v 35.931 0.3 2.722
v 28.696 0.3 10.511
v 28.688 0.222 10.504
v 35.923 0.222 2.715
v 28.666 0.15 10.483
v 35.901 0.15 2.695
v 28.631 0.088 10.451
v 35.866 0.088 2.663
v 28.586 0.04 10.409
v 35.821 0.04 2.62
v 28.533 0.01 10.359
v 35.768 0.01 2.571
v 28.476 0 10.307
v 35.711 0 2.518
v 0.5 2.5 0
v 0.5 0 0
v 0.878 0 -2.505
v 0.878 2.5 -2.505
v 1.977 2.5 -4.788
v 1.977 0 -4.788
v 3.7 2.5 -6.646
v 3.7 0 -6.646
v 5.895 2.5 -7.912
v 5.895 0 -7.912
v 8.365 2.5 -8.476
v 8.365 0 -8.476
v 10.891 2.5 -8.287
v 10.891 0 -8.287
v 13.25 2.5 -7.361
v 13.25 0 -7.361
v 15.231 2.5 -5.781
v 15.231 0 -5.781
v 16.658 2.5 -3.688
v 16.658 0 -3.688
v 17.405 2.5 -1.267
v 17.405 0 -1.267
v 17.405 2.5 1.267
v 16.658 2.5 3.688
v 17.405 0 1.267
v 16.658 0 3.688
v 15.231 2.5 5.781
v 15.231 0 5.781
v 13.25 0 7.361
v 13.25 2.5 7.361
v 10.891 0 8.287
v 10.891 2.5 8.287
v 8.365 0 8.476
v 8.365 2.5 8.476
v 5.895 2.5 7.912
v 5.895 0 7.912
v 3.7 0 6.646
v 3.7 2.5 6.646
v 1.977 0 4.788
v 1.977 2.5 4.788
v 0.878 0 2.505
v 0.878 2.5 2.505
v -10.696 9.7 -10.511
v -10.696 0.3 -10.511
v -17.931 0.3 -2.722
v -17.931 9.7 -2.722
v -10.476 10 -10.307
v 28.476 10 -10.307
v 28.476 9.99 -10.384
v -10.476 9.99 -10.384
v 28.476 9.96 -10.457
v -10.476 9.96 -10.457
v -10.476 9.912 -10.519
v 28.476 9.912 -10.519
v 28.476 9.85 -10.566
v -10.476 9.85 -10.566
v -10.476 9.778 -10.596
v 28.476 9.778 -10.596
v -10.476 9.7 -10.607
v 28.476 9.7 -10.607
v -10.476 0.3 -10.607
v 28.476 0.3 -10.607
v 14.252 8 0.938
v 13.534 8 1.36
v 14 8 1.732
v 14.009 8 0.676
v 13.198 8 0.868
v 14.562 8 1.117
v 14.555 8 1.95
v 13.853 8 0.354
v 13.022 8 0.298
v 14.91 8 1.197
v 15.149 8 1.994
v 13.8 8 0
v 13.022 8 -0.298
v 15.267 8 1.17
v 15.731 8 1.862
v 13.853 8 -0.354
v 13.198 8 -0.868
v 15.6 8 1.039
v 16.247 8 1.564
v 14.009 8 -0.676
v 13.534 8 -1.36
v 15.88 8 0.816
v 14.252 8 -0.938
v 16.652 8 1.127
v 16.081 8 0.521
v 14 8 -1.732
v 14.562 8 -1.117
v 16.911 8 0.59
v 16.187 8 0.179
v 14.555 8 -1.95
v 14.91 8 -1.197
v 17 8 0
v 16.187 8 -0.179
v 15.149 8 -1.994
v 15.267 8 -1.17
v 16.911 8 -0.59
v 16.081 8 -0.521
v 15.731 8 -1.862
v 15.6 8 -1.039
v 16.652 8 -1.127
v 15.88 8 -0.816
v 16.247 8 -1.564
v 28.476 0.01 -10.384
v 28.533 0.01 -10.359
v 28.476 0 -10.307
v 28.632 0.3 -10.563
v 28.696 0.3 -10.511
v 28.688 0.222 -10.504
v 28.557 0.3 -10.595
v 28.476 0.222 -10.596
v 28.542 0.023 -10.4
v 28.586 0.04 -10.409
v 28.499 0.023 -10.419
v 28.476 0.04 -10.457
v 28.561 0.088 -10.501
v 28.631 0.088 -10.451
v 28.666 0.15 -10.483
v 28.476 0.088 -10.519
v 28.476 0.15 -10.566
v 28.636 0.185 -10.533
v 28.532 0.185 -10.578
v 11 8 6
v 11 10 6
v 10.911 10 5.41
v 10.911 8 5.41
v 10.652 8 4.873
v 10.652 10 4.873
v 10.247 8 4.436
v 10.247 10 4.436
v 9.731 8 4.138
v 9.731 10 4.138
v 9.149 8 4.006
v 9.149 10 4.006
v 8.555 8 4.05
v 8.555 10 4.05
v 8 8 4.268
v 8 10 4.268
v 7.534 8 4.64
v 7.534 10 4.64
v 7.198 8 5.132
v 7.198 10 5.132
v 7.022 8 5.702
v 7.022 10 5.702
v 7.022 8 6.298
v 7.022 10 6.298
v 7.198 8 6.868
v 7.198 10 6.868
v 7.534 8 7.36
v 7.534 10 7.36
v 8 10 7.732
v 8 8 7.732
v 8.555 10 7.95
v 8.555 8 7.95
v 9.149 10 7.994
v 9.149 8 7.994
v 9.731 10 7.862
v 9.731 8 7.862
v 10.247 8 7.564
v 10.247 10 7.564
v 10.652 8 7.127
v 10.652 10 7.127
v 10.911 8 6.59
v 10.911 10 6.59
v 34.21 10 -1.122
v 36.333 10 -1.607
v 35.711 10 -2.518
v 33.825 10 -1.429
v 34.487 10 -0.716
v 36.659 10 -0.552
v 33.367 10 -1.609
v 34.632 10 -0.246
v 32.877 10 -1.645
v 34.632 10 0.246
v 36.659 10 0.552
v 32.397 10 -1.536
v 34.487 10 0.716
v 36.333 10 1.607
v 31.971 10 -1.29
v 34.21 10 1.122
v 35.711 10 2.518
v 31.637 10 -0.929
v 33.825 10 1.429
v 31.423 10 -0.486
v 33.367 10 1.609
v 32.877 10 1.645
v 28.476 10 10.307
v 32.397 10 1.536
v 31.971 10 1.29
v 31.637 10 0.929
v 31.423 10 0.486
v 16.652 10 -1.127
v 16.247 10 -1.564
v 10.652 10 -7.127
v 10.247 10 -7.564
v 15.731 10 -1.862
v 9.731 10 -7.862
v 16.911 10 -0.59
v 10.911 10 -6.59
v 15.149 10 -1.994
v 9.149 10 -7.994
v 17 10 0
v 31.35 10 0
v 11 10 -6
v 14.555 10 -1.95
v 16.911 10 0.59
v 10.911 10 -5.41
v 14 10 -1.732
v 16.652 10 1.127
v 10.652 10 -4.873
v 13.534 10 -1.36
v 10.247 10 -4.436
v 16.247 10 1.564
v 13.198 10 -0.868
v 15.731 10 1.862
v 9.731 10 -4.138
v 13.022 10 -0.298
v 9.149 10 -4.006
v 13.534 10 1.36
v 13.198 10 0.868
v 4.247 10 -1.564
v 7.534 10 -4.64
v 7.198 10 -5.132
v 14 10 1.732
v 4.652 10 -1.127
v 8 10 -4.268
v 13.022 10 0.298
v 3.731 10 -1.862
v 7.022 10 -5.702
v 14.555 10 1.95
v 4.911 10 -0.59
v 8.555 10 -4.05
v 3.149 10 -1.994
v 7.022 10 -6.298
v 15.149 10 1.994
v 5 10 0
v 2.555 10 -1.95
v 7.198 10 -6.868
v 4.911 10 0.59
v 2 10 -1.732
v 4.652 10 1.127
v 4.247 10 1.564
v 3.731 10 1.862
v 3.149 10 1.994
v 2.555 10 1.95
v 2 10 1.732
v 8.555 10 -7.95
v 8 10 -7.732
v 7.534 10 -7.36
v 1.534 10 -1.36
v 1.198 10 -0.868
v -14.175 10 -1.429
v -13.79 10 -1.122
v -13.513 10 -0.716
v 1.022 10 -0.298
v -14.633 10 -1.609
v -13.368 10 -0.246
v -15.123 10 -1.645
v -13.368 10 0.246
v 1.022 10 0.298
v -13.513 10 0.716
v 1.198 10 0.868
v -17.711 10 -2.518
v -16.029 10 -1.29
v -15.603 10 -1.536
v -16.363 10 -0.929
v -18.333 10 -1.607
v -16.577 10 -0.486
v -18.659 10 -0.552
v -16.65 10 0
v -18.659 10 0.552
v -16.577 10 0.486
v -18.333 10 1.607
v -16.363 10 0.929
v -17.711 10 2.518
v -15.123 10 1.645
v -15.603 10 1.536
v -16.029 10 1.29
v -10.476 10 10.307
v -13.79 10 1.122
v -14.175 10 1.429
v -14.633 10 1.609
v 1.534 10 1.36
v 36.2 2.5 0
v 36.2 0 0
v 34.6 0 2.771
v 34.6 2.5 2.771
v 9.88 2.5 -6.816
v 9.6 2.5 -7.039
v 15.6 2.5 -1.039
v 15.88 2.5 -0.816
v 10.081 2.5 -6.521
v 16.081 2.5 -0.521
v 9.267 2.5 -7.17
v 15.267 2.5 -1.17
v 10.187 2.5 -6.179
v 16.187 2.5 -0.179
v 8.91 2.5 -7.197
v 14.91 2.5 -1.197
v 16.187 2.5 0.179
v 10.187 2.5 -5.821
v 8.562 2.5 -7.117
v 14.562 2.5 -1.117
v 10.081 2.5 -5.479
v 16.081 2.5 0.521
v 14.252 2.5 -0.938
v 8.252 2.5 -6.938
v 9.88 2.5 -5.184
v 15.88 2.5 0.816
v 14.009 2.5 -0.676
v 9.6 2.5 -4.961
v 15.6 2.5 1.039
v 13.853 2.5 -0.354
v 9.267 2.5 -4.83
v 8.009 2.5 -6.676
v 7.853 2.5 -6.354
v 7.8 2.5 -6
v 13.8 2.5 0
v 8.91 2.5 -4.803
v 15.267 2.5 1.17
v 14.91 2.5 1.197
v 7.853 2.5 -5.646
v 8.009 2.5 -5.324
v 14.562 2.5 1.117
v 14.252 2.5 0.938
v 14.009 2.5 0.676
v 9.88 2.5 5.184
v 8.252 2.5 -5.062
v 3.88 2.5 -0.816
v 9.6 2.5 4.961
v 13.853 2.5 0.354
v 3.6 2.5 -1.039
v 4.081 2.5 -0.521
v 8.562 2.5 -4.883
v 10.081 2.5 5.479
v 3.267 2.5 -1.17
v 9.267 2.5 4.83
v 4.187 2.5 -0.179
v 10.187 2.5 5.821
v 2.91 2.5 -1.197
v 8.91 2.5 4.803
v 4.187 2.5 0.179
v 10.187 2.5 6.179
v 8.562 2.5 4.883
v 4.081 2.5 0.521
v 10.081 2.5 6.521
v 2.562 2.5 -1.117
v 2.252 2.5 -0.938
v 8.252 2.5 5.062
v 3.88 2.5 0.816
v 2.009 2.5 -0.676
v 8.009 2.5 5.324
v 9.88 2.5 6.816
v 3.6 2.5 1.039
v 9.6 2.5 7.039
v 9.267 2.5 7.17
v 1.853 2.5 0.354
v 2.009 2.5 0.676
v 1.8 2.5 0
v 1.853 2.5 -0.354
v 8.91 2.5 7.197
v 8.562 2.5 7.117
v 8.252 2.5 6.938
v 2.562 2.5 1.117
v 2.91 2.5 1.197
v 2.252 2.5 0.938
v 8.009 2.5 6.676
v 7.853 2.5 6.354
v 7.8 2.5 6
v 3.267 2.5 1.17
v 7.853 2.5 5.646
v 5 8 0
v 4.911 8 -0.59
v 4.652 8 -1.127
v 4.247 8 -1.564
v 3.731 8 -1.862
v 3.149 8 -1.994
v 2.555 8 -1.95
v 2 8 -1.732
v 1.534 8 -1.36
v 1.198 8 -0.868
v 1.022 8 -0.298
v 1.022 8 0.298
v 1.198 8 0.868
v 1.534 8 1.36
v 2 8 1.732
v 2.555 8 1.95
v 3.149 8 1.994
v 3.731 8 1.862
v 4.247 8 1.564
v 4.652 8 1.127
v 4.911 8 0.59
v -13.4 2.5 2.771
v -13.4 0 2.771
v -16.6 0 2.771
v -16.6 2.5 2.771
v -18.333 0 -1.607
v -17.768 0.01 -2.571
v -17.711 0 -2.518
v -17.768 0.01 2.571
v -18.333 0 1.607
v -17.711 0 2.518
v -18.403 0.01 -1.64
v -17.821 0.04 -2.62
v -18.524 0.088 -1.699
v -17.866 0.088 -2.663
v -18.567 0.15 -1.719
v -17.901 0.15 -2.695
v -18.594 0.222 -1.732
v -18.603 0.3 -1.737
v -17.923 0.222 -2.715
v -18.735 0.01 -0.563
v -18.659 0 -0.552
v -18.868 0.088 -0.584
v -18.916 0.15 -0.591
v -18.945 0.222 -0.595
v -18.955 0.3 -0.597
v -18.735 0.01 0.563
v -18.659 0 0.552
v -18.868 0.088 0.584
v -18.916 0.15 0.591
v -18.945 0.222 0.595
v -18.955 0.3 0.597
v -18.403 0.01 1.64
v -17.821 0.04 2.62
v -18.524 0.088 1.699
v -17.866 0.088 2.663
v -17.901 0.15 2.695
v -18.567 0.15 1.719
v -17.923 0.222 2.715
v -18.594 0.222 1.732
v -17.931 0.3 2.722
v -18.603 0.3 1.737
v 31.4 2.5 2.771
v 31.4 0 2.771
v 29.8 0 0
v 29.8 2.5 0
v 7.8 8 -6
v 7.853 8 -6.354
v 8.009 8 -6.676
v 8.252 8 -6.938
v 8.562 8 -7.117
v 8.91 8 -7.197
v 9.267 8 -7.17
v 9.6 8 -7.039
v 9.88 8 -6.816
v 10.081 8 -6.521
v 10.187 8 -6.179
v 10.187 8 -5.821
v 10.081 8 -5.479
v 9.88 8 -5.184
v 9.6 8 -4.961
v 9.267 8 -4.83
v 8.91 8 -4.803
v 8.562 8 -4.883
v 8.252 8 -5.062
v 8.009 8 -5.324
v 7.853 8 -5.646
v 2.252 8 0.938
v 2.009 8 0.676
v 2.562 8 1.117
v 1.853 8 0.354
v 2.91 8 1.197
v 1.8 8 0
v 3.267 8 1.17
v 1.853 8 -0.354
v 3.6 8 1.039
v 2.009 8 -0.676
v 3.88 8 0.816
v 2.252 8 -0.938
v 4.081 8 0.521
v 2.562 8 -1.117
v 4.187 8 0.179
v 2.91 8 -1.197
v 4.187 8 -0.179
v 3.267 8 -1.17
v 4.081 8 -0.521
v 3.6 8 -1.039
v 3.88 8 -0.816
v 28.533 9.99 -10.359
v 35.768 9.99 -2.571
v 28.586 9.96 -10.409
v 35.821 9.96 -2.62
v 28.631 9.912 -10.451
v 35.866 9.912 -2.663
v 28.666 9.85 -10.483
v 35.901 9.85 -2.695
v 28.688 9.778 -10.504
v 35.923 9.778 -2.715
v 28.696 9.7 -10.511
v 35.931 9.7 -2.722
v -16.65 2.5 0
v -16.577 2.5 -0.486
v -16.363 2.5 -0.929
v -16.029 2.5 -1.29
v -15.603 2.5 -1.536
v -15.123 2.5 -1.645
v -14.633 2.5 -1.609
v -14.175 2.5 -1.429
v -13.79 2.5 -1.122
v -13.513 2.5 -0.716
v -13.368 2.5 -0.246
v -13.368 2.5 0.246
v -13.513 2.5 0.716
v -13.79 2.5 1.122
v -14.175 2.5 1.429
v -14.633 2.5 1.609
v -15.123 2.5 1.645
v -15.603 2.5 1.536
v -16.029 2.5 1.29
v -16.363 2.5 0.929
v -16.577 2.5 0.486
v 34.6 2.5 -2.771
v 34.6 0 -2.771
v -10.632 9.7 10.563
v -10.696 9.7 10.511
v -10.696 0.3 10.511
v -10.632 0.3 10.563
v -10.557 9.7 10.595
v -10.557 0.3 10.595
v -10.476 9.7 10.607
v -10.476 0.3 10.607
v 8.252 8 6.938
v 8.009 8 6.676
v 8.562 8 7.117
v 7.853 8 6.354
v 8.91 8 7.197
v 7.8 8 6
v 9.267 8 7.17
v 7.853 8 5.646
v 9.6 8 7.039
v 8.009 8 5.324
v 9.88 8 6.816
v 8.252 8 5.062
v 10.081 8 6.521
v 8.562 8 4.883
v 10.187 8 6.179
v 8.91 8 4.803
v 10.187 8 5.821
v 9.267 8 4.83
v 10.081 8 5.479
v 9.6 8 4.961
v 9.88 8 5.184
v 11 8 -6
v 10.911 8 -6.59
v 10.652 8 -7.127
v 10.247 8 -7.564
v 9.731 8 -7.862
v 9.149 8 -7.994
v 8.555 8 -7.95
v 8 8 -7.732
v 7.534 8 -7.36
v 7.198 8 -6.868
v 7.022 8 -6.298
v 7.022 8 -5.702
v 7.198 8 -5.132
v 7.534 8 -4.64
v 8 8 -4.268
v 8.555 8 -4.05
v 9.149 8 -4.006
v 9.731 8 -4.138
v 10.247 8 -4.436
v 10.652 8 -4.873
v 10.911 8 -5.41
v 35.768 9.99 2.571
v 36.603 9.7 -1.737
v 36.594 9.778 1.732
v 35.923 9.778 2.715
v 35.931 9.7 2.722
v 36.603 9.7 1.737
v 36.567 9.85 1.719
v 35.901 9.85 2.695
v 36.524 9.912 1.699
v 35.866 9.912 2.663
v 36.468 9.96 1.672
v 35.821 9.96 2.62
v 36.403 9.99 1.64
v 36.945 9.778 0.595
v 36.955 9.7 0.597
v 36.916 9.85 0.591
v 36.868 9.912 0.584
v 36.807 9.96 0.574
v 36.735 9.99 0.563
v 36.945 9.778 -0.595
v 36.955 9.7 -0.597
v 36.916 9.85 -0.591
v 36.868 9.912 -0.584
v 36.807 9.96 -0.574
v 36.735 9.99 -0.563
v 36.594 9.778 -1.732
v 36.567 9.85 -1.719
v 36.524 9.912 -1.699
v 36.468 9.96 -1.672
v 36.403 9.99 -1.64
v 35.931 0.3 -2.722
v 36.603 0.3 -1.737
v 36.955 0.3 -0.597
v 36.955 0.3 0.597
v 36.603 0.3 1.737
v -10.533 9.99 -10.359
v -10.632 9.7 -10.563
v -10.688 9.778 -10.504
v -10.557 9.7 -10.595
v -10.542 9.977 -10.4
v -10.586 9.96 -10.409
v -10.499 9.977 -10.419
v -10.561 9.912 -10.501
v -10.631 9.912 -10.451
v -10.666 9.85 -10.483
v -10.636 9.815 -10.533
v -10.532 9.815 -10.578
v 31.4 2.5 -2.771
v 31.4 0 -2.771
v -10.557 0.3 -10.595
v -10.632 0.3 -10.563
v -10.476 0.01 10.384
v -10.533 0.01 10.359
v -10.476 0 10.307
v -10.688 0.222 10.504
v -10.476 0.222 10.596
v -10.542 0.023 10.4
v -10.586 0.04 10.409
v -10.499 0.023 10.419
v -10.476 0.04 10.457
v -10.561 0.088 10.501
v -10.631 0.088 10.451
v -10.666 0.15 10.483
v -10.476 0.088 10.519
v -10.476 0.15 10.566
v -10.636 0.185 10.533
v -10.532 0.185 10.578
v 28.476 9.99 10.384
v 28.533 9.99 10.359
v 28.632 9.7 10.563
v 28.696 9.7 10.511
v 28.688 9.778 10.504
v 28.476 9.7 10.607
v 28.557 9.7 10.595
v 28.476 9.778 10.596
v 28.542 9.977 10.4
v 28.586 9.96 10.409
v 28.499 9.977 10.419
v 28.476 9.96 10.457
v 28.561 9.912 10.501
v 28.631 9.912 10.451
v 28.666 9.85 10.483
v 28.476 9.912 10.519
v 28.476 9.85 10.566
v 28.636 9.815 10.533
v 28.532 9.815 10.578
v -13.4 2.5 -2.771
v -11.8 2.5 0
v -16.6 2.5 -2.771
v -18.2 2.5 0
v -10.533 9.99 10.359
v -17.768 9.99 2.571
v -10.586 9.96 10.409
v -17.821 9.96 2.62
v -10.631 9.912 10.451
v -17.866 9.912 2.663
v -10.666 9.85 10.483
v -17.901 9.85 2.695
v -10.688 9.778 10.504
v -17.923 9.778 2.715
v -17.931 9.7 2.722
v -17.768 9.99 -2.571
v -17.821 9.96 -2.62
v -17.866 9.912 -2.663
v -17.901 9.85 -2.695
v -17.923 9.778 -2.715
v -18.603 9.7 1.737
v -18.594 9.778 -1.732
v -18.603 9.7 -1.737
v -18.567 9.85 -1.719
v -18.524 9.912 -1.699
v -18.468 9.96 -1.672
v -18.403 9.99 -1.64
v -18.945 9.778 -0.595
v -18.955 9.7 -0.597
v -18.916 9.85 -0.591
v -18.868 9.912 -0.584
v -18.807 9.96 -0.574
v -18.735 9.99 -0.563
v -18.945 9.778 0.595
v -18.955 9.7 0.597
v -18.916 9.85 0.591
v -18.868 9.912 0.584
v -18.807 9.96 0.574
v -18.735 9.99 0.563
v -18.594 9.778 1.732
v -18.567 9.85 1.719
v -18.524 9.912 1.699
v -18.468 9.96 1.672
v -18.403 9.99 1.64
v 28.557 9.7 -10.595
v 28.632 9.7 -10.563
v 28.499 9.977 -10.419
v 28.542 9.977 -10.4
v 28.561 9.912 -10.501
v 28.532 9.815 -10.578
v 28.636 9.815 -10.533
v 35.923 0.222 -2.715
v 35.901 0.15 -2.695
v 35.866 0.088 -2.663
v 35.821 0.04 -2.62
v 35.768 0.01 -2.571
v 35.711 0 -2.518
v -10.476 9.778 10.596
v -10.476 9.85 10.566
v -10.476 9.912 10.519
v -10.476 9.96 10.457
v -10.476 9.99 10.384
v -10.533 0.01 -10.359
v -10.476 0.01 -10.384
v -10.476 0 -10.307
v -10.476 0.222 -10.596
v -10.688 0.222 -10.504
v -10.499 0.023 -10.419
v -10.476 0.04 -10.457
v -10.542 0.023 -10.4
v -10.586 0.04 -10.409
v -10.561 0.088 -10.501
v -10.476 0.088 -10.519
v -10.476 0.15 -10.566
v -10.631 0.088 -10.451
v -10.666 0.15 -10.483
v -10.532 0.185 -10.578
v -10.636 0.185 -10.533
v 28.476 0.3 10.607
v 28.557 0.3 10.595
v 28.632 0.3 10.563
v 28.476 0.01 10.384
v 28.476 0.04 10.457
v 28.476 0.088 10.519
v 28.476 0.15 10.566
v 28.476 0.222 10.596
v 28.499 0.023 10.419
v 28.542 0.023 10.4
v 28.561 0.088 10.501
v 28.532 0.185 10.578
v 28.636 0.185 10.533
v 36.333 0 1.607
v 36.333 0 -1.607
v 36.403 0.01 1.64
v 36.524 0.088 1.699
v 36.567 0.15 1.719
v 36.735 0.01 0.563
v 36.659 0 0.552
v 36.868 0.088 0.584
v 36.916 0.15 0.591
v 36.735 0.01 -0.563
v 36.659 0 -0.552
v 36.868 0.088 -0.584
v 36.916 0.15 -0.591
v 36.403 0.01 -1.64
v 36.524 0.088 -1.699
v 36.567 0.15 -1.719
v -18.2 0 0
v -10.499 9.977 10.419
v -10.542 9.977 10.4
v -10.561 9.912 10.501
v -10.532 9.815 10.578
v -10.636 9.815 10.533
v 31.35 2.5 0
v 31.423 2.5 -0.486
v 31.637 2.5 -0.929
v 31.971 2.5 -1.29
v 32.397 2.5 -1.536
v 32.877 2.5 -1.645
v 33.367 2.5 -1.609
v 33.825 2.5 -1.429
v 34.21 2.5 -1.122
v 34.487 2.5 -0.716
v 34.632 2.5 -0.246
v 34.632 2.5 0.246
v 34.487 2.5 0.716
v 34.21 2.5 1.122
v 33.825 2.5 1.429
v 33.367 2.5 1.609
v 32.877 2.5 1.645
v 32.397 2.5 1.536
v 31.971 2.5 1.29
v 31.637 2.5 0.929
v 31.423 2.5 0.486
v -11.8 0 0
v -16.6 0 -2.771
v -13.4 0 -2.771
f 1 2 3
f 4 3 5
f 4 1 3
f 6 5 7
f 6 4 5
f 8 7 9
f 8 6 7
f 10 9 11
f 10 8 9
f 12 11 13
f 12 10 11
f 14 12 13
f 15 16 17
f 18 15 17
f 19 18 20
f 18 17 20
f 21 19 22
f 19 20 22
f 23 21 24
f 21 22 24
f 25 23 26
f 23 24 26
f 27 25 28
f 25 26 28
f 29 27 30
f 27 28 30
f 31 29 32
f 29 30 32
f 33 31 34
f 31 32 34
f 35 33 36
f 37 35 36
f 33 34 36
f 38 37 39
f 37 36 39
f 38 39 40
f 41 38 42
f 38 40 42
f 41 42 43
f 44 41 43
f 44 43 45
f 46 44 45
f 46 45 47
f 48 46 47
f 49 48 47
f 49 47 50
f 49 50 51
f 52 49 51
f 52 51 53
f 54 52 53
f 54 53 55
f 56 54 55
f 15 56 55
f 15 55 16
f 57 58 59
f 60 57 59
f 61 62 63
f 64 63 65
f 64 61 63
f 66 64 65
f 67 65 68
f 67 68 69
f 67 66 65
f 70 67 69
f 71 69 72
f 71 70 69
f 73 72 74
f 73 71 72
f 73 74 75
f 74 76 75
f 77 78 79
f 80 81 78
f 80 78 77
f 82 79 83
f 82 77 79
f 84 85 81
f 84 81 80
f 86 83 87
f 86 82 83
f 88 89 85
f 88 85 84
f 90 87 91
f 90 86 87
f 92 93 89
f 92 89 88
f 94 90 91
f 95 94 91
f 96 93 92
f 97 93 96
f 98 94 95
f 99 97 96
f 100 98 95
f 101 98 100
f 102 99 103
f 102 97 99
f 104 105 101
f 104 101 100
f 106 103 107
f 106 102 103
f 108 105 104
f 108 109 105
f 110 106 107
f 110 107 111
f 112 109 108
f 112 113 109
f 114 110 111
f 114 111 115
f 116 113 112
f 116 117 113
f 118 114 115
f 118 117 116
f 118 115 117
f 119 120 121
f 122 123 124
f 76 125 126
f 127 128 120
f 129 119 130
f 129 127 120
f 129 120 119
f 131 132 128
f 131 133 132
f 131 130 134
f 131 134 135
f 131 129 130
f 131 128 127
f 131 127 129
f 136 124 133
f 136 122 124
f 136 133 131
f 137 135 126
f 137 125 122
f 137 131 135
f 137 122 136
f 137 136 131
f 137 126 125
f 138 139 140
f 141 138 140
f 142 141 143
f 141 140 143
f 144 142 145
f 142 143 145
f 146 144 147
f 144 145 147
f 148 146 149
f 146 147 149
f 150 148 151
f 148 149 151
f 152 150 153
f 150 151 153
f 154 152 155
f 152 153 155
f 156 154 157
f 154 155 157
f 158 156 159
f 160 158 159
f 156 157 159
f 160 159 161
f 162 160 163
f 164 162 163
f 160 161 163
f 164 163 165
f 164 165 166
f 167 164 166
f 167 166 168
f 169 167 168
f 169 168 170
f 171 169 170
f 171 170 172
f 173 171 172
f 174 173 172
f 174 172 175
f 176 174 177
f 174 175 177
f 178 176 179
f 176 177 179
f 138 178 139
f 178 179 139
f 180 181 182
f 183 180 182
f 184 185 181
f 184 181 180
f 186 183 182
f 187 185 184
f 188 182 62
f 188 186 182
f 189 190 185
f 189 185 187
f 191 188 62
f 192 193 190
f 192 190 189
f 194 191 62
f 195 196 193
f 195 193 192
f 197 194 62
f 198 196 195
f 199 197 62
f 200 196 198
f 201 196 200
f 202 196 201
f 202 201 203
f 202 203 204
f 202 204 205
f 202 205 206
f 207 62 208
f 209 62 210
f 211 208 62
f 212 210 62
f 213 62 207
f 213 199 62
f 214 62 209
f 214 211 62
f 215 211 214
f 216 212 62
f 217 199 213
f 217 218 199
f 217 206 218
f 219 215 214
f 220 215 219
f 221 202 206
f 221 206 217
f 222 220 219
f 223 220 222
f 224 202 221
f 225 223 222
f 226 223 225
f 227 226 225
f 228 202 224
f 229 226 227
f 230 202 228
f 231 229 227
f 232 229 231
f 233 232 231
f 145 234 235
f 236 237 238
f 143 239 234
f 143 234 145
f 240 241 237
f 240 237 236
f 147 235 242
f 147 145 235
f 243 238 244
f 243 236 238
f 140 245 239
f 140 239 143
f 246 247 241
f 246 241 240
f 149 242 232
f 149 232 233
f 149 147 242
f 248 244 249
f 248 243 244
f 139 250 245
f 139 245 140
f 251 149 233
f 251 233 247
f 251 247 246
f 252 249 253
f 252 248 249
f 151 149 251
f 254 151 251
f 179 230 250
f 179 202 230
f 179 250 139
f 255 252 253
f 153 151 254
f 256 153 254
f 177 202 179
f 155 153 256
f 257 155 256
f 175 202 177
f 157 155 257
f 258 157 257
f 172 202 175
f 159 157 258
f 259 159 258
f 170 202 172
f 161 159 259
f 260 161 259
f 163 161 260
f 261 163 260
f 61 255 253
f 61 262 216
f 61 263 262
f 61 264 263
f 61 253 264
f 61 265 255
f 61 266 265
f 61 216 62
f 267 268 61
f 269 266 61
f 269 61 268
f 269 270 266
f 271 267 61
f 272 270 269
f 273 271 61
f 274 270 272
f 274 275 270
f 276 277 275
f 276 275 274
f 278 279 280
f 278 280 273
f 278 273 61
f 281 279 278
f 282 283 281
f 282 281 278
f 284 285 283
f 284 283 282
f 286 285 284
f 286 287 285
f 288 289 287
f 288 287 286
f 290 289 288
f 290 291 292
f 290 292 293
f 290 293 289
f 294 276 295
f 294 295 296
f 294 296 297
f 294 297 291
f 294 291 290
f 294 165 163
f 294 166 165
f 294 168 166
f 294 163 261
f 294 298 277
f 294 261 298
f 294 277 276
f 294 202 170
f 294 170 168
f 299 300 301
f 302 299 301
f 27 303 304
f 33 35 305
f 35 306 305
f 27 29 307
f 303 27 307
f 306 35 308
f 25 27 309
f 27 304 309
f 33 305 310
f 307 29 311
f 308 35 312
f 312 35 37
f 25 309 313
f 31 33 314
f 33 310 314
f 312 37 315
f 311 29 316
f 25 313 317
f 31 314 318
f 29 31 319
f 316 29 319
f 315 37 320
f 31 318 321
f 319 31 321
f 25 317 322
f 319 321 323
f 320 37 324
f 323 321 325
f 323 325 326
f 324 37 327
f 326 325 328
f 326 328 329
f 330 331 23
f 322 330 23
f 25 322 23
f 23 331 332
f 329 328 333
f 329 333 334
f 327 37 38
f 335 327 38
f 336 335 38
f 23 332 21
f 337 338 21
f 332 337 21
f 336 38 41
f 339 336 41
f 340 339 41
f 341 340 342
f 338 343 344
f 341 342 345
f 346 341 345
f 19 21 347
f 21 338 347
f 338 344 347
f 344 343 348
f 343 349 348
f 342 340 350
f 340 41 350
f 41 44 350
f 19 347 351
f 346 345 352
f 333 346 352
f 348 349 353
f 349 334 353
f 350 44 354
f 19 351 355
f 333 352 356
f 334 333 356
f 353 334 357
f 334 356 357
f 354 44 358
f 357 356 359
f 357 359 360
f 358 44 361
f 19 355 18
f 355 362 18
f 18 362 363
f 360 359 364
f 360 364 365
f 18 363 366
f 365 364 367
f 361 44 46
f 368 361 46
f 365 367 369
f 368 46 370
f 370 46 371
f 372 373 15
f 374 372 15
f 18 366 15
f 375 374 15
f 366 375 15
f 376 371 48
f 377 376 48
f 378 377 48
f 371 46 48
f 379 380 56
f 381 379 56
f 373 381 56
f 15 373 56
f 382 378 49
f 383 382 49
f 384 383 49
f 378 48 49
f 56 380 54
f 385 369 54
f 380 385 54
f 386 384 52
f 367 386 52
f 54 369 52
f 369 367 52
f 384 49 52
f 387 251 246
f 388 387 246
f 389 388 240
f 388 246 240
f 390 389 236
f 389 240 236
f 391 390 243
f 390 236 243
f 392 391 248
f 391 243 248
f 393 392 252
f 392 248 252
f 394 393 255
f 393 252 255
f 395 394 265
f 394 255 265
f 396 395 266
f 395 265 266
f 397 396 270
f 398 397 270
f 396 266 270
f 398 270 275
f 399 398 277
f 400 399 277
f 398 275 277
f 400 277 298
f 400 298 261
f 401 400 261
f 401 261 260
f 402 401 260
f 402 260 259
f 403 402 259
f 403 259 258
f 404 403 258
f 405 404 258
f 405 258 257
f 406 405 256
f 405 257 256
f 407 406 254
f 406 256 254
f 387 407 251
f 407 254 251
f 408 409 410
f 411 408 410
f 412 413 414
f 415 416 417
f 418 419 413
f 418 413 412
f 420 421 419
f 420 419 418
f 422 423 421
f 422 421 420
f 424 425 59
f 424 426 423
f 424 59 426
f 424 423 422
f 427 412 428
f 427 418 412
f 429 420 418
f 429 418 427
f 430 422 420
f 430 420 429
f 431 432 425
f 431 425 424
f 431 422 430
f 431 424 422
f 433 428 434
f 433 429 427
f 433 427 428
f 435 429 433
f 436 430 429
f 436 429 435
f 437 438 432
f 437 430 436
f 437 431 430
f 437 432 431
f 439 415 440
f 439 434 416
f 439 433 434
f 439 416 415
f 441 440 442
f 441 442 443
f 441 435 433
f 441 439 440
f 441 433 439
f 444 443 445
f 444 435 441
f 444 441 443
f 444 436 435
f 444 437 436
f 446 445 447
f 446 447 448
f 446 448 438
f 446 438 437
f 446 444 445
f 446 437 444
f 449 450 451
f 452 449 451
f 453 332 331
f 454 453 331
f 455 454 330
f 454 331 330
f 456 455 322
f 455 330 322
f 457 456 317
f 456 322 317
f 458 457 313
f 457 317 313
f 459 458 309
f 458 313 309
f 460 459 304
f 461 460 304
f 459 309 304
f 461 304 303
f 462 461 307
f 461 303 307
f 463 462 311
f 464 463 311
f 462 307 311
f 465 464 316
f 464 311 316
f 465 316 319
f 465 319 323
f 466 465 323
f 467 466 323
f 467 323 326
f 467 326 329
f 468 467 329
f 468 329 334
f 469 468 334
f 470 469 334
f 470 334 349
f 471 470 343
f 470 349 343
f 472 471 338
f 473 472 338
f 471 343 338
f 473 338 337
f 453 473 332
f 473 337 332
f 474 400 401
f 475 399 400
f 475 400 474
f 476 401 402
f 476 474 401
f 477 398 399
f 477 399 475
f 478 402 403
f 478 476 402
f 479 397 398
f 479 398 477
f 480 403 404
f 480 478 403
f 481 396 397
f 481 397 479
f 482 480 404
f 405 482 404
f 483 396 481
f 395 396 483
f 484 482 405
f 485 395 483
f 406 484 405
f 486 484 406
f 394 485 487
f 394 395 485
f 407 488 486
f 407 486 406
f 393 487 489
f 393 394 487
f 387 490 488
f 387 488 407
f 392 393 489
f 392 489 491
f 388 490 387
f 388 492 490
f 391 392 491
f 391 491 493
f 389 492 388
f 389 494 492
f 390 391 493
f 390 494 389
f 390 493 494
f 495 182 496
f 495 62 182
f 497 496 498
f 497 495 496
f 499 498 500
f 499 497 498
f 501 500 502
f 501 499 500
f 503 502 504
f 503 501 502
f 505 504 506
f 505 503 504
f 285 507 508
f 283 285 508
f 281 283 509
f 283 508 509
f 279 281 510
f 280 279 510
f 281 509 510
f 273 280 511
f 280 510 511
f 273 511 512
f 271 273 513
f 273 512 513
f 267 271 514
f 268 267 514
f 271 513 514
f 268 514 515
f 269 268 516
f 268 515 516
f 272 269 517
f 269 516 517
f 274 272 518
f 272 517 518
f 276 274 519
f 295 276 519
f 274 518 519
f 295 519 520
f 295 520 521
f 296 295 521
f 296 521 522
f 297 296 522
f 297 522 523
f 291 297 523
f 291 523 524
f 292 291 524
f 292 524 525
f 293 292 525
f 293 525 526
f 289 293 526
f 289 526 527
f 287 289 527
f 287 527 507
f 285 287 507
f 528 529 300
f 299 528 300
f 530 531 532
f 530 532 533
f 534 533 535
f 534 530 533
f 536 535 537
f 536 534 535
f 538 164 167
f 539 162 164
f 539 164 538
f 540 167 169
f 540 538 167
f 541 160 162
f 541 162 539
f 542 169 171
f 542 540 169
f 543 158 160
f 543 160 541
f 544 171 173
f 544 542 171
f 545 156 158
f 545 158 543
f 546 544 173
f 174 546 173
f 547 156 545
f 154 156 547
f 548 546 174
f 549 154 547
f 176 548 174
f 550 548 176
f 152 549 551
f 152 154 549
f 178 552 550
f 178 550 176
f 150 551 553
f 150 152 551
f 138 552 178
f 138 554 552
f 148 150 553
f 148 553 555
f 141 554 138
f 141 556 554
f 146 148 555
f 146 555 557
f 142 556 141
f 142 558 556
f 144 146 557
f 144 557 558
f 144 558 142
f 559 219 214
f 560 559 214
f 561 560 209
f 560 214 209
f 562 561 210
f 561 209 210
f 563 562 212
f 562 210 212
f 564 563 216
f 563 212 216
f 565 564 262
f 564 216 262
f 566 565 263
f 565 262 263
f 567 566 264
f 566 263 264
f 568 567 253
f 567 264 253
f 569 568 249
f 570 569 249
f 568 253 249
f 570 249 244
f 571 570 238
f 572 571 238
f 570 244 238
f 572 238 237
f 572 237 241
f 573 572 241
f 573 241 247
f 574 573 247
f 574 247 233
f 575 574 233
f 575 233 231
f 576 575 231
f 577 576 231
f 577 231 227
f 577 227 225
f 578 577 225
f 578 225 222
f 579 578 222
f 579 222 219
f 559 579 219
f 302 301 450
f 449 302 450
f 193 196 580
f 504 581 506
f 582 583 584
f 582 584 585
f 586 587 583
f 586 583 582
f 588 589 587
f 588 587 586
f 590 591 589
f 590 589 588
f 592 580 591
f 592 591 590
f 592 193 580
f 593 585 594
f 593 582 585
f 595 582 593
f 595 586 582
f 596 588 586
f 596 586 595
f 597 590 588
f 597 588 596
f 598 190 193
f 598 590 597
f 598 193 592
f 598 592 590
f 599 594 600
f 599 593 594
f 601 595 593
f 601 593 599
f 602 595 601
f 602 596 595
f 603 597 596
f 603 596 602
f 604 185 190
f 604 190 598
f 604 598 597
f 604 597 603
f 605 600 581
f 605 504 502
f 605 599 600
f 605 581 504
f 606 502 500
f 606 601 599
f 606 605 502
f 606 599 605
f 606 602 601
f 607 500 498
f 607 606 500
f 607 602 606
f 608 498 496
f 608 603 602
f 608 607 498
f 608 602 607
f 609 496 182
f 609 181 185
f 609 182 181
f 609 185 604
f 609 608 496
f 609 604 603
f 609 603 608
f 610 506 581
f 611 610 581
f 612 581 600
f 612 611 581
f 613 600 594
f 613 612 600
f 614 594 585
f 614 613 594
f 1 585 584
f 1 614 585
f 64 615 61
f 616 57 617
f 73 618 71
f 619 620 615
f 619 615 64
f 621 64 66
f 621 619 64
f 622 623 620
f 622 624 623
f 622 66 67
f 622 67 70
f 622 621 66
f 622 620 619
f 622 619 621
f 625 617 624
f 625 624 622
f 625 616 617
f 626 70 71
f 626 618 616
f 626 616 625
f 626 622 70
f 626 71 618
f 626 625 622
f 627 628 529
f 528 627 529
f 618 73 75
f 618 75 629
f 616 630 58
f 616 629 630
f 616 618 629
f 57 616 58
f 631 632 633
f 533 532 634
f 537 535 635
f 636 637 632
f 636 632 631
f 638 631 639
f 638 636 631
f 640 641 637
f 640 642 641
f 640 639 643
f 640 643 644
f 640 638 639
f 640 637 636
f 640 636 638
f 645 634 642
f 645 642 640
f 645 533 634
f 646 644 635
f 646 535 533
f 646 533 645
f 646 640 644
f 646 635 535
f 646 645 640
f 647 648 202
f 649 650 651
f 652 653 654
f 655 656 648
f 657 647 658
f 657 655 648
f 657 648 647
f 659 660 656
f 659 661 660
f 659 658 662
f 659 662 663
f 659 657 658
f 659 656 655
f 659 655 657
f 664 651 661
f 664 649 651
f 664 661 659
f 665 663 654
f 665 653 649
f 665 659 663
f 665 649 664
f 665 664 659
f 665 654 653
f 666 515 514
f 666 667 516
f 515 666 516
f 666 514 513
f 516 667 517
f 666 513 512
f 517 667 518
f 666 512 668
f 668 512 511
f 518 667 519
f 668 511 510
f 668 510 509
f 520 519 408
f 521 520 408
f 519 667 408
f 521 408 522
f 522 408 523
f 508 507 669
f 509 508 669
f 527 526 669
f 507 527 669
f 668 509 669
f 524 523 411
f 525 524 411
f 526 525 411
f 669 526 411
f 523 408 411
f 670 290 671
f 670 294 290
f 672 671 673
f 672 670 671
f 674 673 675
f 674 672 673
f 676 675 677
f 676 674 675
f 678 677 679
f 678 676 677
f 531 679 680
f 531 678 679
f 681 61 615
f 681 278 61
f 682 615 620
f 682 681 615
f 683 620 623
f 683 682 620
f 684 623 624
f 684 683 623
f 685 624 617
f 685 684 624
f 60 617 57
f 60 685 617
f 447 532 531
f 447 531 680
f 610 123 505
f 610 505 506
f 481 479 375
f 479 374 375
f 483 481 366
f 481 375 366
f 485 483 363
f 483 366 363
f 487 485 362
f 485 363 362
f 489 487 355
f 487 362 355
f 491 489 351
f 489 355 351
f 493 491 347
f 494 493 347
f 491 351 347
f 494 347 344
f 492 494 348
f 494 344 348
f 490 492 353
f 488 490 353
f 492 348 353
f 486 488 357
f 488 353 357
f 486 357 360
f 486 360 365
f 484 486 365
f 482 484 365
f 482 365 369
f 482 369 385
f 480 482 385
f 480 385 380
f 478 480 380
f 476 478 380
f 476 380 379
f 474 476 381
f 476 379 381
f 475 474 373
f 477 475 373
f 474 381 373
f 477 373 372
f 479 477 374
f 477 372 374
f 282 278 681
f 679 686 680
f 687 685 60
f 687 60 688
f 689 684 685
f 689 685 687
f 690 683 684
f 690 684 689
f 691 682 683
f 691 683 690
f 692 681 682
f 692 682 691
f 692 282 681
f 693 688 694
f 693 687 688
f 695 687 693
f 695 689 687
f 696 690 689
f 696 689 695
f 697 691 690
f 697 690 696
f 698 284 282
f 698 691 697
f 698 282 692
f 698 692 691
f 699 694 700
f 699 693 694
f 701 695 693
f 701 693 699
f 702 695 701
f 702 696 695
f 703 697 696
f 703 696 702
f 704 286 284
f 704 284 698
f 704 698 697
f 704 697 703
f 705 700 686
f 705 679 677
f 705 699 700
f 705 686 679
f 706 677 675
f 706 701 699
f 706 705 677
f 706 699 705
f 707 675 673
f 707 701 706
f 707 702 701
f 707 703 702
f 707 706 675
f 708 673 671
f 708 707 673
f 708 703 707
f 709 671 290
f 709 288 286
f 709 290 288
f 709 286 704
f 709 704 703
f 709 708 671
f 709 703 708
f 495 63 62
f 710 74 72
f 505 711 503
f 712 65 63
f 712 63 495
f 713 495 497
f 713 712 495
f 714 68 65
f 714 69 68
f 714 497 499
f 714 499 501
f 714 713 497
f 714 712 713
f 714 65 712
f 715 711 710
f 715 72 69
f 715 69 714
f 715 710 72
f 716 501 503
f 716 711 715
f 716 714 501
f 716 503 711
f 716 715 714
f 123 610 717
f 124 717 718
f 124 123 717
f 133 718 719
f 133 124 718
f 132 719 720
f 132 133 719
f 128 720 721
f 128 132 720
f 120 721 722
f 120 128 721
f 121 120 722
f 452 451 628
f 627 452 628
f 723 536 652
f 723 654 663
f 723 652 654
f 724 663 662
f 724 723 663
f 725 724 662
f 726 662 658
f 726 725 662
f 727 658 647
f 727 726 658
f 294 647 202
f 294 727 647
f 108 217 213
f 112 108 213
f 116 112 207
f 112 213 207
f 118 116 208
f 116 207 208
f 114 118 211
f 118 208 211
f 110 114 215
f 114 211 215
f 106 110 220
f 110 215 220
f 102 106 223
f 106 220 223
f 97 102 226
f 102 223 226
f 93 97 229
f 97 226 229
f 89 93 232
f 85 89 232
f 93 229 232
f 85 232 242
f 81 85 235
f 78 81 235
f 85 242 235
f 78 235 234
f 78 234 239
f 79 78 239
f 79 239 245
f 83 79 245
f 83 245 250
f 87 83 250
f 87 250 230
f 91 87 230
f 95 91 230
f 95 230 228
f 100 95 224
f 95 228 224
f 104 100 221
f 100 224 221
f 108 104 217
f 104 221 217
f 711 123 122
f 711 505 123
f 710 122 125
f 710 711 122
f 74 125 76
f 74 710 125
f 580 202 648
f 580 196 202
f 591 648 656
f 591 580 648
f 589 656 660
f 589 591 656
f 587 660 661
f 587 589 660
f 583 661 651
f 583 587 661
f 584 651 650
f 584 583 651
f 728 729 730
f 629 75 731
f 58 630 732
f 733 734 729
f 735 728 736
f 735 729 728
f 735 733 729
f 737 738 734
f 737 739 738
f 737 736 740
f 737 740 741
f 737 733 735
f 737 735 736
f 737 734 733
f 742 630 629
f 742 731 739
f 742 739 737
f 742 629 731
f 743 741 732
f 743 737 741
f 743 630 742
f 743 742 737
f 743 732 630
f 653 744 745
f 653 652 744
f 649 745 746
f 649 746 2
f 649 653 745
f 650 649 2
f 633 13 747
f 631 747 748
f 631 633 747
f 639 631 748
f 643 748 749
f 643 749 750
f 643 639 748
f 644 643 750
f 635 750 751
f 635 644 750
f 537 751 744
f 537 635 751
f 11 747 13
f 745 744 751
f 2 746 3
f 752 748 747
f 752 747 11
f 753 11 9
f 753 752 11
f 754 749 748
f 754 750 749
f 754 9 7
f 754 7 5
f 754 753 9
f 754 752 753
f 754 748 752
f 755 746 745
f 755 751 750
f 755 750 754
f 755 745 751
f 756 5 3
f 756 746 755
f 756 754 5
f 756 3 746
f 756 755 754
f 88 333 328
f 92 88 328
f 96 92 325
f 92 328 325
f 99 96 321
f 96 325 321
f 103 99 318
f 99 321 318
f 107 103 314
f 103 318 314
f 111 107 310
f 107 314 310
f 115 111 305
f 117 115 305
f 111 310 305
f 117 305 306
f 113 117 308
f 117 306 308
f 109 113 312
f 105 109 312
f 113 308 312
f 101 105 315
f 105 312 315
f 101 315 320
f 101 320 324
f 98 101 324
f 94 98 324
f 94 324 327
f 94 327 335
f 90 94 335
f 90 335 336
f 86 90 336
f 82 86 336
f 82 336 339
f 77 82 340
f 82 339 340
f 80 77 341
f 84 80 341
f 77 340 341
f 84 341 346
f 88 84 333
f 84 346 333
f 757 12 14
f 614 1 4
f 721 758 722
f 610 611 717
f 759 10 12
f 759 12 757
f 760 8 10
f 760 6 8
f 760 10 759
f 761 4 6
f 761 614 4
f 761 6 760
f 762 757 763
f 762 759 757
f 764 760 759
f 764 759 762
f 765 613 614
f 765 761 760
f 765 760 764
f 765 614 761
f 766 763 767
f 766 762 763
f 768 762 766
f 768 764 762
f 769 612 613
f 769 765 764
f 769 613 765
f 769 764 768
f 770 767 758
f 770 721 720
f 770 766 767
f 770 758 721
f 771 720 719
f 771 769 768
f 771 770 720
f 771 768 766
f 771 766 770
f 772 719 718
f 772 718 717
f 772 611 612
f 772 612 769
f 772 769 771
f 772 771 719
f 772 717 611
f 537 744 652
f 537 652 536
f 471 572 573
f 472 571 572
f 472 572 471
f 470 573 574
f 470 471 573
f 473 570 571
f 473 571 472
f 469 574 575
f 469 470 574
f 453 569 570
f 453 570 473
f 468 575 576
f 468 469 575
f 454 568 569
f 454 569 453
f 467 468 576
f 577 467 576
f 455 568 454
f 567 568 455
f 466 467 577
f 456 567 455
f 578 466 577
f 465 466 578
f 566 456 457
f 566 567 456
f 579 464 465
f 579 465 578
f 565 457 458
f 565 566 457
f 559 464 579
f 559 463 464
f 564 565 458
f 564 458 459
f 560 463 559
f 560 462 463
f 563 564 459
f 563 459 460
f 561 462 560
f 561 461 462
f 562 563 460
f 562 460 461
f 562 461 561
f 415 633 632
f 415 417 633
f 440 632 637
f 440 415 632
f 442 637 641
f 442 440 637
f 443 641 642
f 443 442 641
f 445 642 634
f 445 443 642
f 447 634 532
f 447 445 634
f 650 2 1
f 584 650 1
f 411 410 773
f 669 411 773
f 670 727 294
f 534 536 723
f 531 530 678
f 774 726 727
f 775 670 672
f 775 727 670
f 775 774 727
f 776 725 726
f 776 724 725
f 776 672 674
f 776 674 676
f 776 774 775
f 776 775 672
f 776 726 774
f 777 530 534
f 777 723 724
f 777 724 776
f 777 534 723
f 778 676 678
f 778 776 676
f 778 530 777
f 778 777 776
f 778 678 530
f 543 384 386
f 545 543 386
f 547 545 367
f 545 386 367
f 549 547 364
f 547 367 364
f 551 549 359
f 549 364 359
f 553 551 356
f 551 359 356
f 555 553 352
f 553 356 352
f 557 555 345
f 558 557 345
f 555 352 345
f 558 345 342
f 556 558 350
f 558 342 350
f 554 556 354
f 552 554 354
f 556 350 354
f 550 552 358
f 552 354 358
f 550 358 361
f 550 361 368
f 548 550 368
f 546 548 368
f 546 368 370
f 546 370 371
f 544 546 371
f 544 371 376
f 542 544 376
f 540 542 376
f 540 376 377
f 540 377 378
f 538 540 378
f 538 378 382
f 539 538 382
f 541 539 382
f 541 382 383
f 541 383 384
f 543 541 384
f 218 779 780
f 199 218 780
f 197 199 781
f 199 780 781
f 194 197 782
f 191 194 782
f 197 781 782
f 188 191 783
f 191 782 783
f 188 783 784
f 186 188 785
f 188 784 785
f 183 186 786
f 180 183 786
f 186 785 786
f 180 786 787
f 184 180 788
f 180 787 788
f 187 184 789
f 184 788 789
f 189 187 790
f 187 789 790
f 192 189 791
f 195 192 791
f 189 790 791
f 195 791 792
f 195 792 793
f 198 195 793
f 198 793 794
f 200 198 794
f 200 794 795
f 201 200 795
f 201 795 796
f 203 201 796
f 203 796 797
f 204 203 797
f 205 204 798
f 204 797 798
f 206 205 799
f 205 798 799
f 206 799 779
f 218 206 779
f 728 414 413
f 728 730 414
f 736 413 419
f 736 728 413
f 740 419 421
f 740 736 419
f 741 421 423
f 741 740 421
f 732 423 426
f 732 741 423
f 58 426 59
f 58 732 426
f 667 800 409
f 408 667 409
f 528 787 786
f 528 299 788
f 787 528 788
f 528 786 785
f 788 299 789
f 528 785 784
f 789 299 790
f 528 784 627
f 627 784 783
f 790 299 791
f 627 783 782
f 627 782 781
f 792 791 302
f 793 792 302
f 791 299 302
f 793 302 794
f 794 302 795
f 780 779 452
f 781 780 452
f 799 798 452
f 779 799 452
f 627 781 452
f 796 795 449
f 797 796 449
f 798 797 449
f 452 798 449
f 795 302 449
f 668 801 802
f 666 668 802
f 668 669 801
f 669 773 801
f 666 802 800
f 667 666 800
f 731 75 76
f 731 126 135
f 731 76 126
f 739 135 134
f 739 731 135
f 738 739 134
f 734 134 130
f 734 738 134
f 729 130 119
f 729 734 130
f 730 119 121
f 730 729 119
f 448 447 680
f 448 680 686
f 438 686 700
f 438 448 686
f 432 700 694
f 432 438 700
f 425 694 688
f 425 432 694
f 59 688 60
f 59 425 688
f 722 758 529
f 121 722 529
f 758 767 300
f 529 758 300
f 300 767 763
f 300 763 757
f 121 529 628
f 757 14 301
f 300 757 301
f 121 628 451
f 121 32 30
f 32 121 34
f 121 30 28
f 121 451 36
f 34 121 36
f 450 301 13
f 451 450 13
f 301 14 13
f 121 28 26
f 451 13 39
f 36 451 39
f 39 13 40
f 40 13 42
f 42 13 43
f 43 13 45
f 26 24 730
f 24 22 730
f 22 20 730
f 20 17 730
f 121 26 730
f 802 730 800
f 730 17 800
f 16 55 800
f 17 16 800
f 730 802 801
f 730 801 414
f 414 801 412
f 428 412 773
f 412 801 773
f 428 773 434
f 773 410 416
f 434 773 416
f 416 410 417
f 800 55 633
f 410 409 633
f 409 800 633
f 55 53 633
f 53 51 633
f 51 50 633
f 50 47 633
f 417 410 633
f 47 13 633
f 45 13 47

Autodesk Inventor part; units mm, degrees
ref_plane "YZ Plane" through (0, 0, 0) normal (1, 0, 0) x (0, 1, 0)
ref_plane "XZ Plane" through (0, 0, 0) normal (0, 1, 0) x (-1, 0, 0)
ref_plane "XY Plane" through (0, 0, 0) normal (0, 0, 1) x (1, 0, 0)
sketch "Sketch1" plane through (0, 0, 0) normal (0, 1, 0) x (-1, 0, 0)
  circle A0 centre (-9, 0) radius 8.5
  circle A1 centre (15, 0) radius 4
  line L0 (10.6066, -10.6066) -> (17.9306, -2.7224)
  line L1 (10.6066, 10.6066) -> (17.9306, 2.7224)
  line L2 (16.6, -2.7713) -> (13.4, -2.7713)
  line L3 (13.4, -2.7713) -> (11.8, 0)
  line L4 (11.8, 0) -> (13.4, 2.7713)
  line L5 (13.4, 2.7713) -> (16.6, 2.7713)
  line L6 (16.6, 2.7713) -> (18.2, 0)
  line L7 (18.2, 0) -> (16.6, -2.7713)
  line L8 (15, -2.7713) -> (15, 2.7713)
  line L9 (11.8, 0) -> (15, 0)
  circle A2 centre (-9, 0) radius 6
  circle A3 centre (-9, -6) radius 1.2
  circle A4 centre (-15, 0) radius 1.2
  circle A5 centre (-9, 6) radius 1.2
  circle A6 centre (-3, 0) radius 1.2
  circle A7 centre (15, 0) radius 1.65
  line L10 (11, 0) -> (-29, 0)
  circle A8 centre (-33, 0) radius 4
  line L11 (-28.6066, -10.6066) -> (-35.9306, -2.7224)
  line L12 (-28.6066, 10.6066) -> (-35.9306, 2.7224)
  line L13 (-31.4, -2.7713) -> (-34.6, -2.7713)
  line L14 (-34.6, -2.7713) -> (-36.2, 0)
  line L15 (-36.2, 0) -> (-34.6, 2.7713)
  line L16 (-36.2, 0) -> (-33, 0)
  line L17 (-33, -2.7713) -> (-33, 2.7713)
  line L18 (-34.6, 2.7713) -> (-31.4, 2.7713)
  line L19 (-29.8, 0) -> (-31.4, -2.7713)
  line L20 (-31.4, 2.7713) -> (-29.8, 0)
  circle A9 centre (-33, 0) radius 1.65
  line L21 (-28.6066, -10.6066) -> (10.6066, -10.6066)
  line L22 (-28.6066, 10.6066) -> (10.6066, 10.6066)
  dimension "d49" = 4
  dimension "d55" = 8
  dimension "d22" = 3.2
  dimension "d34" = 12
  dimension "d35" = 2.4
  dimension "d36" = 2.4
  dimension "d37" = 2.4
  dimension "d38" = 2.4
  dimension "d43" = 3.3
  dimension "d54" = 40
  dimension "d56" = 3.2
  dimension "d57" = 3.2
  dimension "d58" = 120
  dimension "d59" = 3.2
  dimension "d60" = 120
  dimension "d61" = 3.3
extrude "Extrusion1" add sketch "Sketch1" along normal blind 10 contours L10 A6 A2 A5 A4 A0 | L10 A1 L0 L21 L11 A8 A0 | A0 L10 A8 L12 L22 L1 A1 | A0 L10 A4 A2 A3 A6 | A1 | L10 A2 A6 | A6 A2 L10 | L10 A2 A4 | A4 A2 L10 | A8 | A6 L10 A4 A2 A5 | A2 L10 A6 | A6 L10 A2 | A2 A3 A4 L10 A6 | A4 L10 A2 | A2 L10 A4 | A5 A2 | A2 A5 | A3 A2 | A2 A3 | L2 L8 A7 L5 L6 L7 | L2 L3 L9 A7 L8 | A7 L9 L8 | L8 A7 | L4 L5 L8 A7 L9 | L9 A7 L8 | L13 L17 A9 L18 L20 L19 | L13 L14 L16 A9 L17 | A9 L16 L17 | L17 A9 | L15 L18 L17 A9 L16 | L16 A9 L17
extrude "Extrusion2" cut sketch "Sketch1" along normal blind 2.5 contours L10 A6 A2 A5 A4 A0 | A0 L10 A4 A2 A3 A6 | L10 A2 A6 | A6 A2 L10 | L10 A2 A4 | A4 A2 L10 | A6 L10 A4 A2 A5 | A2 L10 A6 | A6 L10 A2 | A2 A3 A4 L10 A6 | A4 L10 A2 | A2 L10 A4 | A5 A2 | A2 A5 | A3 A2 | A2 A3 | L2 L8 A7 L5 L6 L7 | L2 L3 L9 A7 L8 | A7 L9 L8 | L8 A7 | L4 L5 L8 A7 L9 | L9 A7 L8 | L13 L17 A9 L18 L20 L19 | L13 L14 L16 A9 L17 | A9 L16 L17 | L17 A9 | L15 L18 L17 A9 L16 | L16 A9 L17
extrude "Extrusion3" cut sketch "Sketch1" along normal blind 10 contours L10 A2 A6 | A6 A2 L10 | L10 A2 A4 | A4 A2 L10 | A2 L10 A6 | A6 L10 A2 | A4 L10 A2 | A2 L10 A4 | A5 A2 | A2 A5 | A3 A2 | A2 A3 | A7 L9 L8 | L8 A7 | L9 A7 L8 | A9 L16 L17 | L17 A9 | L16 A9 L17
fillet "Fillet1" radius 0.3 20 edges at (-19, 0, 0) (-14.2686, 0, 6.6645) (-14.2686, 0, -6.6645) (-19, 10, 0) (-14.2686, 10, 6.6645) (-14.2686, 10, -6.6645) (9, 10, 10.6066) (9, 0, 10.6066) (9, 10, -10.6066) (9, 0, -10.6066) (-10.6066, 5, -10.6066) (-10.6066, 5, 10.6066) (37, 0, 0) (32.2686, 0, -6.6645) (32.2686, 0, 6.6645) (37, 10, 0) (32.2686, 10, -6.6645) (32.2686, 10, 6.6645) (28.6066, 5, -10.6066) (28.6066, 5, 10.6066)
sketch "Sketch2" plane through (0, 10, 0) normal (0, 1, 0) x (1, 0, 0)
  circle A0 centre (3, 0) radius 1.2 projected
  circle A1 centre (3, 0) radius 2
  circle A2 centre (9, 6) radius 1.2 projected
  circle A3 centre (9, 6) radius 2
  circle A4 centre (15, 0) radius 1.2 projected
  circle A5 centre (15, 0) radius 2
  circle A6 centre (9, -6) radius 1.2 projected
  circle A7 centre (9, -6) radius 2
  point P0 (0, 0)
  dimension "d22" = 3.2
  dimension "d43" = 3.3
  dimension "d48" = 4
  dimension "d49" = 4
  dimension "d50" = 4
  dimension "d51" = 4
extrude "Extrusion5" cut sketch "Sketch2" against normal blind 2 contours A0 | A1 | A2 | A3 | A4 | A5 | A6 | A7
properties part number "neck_v2"
